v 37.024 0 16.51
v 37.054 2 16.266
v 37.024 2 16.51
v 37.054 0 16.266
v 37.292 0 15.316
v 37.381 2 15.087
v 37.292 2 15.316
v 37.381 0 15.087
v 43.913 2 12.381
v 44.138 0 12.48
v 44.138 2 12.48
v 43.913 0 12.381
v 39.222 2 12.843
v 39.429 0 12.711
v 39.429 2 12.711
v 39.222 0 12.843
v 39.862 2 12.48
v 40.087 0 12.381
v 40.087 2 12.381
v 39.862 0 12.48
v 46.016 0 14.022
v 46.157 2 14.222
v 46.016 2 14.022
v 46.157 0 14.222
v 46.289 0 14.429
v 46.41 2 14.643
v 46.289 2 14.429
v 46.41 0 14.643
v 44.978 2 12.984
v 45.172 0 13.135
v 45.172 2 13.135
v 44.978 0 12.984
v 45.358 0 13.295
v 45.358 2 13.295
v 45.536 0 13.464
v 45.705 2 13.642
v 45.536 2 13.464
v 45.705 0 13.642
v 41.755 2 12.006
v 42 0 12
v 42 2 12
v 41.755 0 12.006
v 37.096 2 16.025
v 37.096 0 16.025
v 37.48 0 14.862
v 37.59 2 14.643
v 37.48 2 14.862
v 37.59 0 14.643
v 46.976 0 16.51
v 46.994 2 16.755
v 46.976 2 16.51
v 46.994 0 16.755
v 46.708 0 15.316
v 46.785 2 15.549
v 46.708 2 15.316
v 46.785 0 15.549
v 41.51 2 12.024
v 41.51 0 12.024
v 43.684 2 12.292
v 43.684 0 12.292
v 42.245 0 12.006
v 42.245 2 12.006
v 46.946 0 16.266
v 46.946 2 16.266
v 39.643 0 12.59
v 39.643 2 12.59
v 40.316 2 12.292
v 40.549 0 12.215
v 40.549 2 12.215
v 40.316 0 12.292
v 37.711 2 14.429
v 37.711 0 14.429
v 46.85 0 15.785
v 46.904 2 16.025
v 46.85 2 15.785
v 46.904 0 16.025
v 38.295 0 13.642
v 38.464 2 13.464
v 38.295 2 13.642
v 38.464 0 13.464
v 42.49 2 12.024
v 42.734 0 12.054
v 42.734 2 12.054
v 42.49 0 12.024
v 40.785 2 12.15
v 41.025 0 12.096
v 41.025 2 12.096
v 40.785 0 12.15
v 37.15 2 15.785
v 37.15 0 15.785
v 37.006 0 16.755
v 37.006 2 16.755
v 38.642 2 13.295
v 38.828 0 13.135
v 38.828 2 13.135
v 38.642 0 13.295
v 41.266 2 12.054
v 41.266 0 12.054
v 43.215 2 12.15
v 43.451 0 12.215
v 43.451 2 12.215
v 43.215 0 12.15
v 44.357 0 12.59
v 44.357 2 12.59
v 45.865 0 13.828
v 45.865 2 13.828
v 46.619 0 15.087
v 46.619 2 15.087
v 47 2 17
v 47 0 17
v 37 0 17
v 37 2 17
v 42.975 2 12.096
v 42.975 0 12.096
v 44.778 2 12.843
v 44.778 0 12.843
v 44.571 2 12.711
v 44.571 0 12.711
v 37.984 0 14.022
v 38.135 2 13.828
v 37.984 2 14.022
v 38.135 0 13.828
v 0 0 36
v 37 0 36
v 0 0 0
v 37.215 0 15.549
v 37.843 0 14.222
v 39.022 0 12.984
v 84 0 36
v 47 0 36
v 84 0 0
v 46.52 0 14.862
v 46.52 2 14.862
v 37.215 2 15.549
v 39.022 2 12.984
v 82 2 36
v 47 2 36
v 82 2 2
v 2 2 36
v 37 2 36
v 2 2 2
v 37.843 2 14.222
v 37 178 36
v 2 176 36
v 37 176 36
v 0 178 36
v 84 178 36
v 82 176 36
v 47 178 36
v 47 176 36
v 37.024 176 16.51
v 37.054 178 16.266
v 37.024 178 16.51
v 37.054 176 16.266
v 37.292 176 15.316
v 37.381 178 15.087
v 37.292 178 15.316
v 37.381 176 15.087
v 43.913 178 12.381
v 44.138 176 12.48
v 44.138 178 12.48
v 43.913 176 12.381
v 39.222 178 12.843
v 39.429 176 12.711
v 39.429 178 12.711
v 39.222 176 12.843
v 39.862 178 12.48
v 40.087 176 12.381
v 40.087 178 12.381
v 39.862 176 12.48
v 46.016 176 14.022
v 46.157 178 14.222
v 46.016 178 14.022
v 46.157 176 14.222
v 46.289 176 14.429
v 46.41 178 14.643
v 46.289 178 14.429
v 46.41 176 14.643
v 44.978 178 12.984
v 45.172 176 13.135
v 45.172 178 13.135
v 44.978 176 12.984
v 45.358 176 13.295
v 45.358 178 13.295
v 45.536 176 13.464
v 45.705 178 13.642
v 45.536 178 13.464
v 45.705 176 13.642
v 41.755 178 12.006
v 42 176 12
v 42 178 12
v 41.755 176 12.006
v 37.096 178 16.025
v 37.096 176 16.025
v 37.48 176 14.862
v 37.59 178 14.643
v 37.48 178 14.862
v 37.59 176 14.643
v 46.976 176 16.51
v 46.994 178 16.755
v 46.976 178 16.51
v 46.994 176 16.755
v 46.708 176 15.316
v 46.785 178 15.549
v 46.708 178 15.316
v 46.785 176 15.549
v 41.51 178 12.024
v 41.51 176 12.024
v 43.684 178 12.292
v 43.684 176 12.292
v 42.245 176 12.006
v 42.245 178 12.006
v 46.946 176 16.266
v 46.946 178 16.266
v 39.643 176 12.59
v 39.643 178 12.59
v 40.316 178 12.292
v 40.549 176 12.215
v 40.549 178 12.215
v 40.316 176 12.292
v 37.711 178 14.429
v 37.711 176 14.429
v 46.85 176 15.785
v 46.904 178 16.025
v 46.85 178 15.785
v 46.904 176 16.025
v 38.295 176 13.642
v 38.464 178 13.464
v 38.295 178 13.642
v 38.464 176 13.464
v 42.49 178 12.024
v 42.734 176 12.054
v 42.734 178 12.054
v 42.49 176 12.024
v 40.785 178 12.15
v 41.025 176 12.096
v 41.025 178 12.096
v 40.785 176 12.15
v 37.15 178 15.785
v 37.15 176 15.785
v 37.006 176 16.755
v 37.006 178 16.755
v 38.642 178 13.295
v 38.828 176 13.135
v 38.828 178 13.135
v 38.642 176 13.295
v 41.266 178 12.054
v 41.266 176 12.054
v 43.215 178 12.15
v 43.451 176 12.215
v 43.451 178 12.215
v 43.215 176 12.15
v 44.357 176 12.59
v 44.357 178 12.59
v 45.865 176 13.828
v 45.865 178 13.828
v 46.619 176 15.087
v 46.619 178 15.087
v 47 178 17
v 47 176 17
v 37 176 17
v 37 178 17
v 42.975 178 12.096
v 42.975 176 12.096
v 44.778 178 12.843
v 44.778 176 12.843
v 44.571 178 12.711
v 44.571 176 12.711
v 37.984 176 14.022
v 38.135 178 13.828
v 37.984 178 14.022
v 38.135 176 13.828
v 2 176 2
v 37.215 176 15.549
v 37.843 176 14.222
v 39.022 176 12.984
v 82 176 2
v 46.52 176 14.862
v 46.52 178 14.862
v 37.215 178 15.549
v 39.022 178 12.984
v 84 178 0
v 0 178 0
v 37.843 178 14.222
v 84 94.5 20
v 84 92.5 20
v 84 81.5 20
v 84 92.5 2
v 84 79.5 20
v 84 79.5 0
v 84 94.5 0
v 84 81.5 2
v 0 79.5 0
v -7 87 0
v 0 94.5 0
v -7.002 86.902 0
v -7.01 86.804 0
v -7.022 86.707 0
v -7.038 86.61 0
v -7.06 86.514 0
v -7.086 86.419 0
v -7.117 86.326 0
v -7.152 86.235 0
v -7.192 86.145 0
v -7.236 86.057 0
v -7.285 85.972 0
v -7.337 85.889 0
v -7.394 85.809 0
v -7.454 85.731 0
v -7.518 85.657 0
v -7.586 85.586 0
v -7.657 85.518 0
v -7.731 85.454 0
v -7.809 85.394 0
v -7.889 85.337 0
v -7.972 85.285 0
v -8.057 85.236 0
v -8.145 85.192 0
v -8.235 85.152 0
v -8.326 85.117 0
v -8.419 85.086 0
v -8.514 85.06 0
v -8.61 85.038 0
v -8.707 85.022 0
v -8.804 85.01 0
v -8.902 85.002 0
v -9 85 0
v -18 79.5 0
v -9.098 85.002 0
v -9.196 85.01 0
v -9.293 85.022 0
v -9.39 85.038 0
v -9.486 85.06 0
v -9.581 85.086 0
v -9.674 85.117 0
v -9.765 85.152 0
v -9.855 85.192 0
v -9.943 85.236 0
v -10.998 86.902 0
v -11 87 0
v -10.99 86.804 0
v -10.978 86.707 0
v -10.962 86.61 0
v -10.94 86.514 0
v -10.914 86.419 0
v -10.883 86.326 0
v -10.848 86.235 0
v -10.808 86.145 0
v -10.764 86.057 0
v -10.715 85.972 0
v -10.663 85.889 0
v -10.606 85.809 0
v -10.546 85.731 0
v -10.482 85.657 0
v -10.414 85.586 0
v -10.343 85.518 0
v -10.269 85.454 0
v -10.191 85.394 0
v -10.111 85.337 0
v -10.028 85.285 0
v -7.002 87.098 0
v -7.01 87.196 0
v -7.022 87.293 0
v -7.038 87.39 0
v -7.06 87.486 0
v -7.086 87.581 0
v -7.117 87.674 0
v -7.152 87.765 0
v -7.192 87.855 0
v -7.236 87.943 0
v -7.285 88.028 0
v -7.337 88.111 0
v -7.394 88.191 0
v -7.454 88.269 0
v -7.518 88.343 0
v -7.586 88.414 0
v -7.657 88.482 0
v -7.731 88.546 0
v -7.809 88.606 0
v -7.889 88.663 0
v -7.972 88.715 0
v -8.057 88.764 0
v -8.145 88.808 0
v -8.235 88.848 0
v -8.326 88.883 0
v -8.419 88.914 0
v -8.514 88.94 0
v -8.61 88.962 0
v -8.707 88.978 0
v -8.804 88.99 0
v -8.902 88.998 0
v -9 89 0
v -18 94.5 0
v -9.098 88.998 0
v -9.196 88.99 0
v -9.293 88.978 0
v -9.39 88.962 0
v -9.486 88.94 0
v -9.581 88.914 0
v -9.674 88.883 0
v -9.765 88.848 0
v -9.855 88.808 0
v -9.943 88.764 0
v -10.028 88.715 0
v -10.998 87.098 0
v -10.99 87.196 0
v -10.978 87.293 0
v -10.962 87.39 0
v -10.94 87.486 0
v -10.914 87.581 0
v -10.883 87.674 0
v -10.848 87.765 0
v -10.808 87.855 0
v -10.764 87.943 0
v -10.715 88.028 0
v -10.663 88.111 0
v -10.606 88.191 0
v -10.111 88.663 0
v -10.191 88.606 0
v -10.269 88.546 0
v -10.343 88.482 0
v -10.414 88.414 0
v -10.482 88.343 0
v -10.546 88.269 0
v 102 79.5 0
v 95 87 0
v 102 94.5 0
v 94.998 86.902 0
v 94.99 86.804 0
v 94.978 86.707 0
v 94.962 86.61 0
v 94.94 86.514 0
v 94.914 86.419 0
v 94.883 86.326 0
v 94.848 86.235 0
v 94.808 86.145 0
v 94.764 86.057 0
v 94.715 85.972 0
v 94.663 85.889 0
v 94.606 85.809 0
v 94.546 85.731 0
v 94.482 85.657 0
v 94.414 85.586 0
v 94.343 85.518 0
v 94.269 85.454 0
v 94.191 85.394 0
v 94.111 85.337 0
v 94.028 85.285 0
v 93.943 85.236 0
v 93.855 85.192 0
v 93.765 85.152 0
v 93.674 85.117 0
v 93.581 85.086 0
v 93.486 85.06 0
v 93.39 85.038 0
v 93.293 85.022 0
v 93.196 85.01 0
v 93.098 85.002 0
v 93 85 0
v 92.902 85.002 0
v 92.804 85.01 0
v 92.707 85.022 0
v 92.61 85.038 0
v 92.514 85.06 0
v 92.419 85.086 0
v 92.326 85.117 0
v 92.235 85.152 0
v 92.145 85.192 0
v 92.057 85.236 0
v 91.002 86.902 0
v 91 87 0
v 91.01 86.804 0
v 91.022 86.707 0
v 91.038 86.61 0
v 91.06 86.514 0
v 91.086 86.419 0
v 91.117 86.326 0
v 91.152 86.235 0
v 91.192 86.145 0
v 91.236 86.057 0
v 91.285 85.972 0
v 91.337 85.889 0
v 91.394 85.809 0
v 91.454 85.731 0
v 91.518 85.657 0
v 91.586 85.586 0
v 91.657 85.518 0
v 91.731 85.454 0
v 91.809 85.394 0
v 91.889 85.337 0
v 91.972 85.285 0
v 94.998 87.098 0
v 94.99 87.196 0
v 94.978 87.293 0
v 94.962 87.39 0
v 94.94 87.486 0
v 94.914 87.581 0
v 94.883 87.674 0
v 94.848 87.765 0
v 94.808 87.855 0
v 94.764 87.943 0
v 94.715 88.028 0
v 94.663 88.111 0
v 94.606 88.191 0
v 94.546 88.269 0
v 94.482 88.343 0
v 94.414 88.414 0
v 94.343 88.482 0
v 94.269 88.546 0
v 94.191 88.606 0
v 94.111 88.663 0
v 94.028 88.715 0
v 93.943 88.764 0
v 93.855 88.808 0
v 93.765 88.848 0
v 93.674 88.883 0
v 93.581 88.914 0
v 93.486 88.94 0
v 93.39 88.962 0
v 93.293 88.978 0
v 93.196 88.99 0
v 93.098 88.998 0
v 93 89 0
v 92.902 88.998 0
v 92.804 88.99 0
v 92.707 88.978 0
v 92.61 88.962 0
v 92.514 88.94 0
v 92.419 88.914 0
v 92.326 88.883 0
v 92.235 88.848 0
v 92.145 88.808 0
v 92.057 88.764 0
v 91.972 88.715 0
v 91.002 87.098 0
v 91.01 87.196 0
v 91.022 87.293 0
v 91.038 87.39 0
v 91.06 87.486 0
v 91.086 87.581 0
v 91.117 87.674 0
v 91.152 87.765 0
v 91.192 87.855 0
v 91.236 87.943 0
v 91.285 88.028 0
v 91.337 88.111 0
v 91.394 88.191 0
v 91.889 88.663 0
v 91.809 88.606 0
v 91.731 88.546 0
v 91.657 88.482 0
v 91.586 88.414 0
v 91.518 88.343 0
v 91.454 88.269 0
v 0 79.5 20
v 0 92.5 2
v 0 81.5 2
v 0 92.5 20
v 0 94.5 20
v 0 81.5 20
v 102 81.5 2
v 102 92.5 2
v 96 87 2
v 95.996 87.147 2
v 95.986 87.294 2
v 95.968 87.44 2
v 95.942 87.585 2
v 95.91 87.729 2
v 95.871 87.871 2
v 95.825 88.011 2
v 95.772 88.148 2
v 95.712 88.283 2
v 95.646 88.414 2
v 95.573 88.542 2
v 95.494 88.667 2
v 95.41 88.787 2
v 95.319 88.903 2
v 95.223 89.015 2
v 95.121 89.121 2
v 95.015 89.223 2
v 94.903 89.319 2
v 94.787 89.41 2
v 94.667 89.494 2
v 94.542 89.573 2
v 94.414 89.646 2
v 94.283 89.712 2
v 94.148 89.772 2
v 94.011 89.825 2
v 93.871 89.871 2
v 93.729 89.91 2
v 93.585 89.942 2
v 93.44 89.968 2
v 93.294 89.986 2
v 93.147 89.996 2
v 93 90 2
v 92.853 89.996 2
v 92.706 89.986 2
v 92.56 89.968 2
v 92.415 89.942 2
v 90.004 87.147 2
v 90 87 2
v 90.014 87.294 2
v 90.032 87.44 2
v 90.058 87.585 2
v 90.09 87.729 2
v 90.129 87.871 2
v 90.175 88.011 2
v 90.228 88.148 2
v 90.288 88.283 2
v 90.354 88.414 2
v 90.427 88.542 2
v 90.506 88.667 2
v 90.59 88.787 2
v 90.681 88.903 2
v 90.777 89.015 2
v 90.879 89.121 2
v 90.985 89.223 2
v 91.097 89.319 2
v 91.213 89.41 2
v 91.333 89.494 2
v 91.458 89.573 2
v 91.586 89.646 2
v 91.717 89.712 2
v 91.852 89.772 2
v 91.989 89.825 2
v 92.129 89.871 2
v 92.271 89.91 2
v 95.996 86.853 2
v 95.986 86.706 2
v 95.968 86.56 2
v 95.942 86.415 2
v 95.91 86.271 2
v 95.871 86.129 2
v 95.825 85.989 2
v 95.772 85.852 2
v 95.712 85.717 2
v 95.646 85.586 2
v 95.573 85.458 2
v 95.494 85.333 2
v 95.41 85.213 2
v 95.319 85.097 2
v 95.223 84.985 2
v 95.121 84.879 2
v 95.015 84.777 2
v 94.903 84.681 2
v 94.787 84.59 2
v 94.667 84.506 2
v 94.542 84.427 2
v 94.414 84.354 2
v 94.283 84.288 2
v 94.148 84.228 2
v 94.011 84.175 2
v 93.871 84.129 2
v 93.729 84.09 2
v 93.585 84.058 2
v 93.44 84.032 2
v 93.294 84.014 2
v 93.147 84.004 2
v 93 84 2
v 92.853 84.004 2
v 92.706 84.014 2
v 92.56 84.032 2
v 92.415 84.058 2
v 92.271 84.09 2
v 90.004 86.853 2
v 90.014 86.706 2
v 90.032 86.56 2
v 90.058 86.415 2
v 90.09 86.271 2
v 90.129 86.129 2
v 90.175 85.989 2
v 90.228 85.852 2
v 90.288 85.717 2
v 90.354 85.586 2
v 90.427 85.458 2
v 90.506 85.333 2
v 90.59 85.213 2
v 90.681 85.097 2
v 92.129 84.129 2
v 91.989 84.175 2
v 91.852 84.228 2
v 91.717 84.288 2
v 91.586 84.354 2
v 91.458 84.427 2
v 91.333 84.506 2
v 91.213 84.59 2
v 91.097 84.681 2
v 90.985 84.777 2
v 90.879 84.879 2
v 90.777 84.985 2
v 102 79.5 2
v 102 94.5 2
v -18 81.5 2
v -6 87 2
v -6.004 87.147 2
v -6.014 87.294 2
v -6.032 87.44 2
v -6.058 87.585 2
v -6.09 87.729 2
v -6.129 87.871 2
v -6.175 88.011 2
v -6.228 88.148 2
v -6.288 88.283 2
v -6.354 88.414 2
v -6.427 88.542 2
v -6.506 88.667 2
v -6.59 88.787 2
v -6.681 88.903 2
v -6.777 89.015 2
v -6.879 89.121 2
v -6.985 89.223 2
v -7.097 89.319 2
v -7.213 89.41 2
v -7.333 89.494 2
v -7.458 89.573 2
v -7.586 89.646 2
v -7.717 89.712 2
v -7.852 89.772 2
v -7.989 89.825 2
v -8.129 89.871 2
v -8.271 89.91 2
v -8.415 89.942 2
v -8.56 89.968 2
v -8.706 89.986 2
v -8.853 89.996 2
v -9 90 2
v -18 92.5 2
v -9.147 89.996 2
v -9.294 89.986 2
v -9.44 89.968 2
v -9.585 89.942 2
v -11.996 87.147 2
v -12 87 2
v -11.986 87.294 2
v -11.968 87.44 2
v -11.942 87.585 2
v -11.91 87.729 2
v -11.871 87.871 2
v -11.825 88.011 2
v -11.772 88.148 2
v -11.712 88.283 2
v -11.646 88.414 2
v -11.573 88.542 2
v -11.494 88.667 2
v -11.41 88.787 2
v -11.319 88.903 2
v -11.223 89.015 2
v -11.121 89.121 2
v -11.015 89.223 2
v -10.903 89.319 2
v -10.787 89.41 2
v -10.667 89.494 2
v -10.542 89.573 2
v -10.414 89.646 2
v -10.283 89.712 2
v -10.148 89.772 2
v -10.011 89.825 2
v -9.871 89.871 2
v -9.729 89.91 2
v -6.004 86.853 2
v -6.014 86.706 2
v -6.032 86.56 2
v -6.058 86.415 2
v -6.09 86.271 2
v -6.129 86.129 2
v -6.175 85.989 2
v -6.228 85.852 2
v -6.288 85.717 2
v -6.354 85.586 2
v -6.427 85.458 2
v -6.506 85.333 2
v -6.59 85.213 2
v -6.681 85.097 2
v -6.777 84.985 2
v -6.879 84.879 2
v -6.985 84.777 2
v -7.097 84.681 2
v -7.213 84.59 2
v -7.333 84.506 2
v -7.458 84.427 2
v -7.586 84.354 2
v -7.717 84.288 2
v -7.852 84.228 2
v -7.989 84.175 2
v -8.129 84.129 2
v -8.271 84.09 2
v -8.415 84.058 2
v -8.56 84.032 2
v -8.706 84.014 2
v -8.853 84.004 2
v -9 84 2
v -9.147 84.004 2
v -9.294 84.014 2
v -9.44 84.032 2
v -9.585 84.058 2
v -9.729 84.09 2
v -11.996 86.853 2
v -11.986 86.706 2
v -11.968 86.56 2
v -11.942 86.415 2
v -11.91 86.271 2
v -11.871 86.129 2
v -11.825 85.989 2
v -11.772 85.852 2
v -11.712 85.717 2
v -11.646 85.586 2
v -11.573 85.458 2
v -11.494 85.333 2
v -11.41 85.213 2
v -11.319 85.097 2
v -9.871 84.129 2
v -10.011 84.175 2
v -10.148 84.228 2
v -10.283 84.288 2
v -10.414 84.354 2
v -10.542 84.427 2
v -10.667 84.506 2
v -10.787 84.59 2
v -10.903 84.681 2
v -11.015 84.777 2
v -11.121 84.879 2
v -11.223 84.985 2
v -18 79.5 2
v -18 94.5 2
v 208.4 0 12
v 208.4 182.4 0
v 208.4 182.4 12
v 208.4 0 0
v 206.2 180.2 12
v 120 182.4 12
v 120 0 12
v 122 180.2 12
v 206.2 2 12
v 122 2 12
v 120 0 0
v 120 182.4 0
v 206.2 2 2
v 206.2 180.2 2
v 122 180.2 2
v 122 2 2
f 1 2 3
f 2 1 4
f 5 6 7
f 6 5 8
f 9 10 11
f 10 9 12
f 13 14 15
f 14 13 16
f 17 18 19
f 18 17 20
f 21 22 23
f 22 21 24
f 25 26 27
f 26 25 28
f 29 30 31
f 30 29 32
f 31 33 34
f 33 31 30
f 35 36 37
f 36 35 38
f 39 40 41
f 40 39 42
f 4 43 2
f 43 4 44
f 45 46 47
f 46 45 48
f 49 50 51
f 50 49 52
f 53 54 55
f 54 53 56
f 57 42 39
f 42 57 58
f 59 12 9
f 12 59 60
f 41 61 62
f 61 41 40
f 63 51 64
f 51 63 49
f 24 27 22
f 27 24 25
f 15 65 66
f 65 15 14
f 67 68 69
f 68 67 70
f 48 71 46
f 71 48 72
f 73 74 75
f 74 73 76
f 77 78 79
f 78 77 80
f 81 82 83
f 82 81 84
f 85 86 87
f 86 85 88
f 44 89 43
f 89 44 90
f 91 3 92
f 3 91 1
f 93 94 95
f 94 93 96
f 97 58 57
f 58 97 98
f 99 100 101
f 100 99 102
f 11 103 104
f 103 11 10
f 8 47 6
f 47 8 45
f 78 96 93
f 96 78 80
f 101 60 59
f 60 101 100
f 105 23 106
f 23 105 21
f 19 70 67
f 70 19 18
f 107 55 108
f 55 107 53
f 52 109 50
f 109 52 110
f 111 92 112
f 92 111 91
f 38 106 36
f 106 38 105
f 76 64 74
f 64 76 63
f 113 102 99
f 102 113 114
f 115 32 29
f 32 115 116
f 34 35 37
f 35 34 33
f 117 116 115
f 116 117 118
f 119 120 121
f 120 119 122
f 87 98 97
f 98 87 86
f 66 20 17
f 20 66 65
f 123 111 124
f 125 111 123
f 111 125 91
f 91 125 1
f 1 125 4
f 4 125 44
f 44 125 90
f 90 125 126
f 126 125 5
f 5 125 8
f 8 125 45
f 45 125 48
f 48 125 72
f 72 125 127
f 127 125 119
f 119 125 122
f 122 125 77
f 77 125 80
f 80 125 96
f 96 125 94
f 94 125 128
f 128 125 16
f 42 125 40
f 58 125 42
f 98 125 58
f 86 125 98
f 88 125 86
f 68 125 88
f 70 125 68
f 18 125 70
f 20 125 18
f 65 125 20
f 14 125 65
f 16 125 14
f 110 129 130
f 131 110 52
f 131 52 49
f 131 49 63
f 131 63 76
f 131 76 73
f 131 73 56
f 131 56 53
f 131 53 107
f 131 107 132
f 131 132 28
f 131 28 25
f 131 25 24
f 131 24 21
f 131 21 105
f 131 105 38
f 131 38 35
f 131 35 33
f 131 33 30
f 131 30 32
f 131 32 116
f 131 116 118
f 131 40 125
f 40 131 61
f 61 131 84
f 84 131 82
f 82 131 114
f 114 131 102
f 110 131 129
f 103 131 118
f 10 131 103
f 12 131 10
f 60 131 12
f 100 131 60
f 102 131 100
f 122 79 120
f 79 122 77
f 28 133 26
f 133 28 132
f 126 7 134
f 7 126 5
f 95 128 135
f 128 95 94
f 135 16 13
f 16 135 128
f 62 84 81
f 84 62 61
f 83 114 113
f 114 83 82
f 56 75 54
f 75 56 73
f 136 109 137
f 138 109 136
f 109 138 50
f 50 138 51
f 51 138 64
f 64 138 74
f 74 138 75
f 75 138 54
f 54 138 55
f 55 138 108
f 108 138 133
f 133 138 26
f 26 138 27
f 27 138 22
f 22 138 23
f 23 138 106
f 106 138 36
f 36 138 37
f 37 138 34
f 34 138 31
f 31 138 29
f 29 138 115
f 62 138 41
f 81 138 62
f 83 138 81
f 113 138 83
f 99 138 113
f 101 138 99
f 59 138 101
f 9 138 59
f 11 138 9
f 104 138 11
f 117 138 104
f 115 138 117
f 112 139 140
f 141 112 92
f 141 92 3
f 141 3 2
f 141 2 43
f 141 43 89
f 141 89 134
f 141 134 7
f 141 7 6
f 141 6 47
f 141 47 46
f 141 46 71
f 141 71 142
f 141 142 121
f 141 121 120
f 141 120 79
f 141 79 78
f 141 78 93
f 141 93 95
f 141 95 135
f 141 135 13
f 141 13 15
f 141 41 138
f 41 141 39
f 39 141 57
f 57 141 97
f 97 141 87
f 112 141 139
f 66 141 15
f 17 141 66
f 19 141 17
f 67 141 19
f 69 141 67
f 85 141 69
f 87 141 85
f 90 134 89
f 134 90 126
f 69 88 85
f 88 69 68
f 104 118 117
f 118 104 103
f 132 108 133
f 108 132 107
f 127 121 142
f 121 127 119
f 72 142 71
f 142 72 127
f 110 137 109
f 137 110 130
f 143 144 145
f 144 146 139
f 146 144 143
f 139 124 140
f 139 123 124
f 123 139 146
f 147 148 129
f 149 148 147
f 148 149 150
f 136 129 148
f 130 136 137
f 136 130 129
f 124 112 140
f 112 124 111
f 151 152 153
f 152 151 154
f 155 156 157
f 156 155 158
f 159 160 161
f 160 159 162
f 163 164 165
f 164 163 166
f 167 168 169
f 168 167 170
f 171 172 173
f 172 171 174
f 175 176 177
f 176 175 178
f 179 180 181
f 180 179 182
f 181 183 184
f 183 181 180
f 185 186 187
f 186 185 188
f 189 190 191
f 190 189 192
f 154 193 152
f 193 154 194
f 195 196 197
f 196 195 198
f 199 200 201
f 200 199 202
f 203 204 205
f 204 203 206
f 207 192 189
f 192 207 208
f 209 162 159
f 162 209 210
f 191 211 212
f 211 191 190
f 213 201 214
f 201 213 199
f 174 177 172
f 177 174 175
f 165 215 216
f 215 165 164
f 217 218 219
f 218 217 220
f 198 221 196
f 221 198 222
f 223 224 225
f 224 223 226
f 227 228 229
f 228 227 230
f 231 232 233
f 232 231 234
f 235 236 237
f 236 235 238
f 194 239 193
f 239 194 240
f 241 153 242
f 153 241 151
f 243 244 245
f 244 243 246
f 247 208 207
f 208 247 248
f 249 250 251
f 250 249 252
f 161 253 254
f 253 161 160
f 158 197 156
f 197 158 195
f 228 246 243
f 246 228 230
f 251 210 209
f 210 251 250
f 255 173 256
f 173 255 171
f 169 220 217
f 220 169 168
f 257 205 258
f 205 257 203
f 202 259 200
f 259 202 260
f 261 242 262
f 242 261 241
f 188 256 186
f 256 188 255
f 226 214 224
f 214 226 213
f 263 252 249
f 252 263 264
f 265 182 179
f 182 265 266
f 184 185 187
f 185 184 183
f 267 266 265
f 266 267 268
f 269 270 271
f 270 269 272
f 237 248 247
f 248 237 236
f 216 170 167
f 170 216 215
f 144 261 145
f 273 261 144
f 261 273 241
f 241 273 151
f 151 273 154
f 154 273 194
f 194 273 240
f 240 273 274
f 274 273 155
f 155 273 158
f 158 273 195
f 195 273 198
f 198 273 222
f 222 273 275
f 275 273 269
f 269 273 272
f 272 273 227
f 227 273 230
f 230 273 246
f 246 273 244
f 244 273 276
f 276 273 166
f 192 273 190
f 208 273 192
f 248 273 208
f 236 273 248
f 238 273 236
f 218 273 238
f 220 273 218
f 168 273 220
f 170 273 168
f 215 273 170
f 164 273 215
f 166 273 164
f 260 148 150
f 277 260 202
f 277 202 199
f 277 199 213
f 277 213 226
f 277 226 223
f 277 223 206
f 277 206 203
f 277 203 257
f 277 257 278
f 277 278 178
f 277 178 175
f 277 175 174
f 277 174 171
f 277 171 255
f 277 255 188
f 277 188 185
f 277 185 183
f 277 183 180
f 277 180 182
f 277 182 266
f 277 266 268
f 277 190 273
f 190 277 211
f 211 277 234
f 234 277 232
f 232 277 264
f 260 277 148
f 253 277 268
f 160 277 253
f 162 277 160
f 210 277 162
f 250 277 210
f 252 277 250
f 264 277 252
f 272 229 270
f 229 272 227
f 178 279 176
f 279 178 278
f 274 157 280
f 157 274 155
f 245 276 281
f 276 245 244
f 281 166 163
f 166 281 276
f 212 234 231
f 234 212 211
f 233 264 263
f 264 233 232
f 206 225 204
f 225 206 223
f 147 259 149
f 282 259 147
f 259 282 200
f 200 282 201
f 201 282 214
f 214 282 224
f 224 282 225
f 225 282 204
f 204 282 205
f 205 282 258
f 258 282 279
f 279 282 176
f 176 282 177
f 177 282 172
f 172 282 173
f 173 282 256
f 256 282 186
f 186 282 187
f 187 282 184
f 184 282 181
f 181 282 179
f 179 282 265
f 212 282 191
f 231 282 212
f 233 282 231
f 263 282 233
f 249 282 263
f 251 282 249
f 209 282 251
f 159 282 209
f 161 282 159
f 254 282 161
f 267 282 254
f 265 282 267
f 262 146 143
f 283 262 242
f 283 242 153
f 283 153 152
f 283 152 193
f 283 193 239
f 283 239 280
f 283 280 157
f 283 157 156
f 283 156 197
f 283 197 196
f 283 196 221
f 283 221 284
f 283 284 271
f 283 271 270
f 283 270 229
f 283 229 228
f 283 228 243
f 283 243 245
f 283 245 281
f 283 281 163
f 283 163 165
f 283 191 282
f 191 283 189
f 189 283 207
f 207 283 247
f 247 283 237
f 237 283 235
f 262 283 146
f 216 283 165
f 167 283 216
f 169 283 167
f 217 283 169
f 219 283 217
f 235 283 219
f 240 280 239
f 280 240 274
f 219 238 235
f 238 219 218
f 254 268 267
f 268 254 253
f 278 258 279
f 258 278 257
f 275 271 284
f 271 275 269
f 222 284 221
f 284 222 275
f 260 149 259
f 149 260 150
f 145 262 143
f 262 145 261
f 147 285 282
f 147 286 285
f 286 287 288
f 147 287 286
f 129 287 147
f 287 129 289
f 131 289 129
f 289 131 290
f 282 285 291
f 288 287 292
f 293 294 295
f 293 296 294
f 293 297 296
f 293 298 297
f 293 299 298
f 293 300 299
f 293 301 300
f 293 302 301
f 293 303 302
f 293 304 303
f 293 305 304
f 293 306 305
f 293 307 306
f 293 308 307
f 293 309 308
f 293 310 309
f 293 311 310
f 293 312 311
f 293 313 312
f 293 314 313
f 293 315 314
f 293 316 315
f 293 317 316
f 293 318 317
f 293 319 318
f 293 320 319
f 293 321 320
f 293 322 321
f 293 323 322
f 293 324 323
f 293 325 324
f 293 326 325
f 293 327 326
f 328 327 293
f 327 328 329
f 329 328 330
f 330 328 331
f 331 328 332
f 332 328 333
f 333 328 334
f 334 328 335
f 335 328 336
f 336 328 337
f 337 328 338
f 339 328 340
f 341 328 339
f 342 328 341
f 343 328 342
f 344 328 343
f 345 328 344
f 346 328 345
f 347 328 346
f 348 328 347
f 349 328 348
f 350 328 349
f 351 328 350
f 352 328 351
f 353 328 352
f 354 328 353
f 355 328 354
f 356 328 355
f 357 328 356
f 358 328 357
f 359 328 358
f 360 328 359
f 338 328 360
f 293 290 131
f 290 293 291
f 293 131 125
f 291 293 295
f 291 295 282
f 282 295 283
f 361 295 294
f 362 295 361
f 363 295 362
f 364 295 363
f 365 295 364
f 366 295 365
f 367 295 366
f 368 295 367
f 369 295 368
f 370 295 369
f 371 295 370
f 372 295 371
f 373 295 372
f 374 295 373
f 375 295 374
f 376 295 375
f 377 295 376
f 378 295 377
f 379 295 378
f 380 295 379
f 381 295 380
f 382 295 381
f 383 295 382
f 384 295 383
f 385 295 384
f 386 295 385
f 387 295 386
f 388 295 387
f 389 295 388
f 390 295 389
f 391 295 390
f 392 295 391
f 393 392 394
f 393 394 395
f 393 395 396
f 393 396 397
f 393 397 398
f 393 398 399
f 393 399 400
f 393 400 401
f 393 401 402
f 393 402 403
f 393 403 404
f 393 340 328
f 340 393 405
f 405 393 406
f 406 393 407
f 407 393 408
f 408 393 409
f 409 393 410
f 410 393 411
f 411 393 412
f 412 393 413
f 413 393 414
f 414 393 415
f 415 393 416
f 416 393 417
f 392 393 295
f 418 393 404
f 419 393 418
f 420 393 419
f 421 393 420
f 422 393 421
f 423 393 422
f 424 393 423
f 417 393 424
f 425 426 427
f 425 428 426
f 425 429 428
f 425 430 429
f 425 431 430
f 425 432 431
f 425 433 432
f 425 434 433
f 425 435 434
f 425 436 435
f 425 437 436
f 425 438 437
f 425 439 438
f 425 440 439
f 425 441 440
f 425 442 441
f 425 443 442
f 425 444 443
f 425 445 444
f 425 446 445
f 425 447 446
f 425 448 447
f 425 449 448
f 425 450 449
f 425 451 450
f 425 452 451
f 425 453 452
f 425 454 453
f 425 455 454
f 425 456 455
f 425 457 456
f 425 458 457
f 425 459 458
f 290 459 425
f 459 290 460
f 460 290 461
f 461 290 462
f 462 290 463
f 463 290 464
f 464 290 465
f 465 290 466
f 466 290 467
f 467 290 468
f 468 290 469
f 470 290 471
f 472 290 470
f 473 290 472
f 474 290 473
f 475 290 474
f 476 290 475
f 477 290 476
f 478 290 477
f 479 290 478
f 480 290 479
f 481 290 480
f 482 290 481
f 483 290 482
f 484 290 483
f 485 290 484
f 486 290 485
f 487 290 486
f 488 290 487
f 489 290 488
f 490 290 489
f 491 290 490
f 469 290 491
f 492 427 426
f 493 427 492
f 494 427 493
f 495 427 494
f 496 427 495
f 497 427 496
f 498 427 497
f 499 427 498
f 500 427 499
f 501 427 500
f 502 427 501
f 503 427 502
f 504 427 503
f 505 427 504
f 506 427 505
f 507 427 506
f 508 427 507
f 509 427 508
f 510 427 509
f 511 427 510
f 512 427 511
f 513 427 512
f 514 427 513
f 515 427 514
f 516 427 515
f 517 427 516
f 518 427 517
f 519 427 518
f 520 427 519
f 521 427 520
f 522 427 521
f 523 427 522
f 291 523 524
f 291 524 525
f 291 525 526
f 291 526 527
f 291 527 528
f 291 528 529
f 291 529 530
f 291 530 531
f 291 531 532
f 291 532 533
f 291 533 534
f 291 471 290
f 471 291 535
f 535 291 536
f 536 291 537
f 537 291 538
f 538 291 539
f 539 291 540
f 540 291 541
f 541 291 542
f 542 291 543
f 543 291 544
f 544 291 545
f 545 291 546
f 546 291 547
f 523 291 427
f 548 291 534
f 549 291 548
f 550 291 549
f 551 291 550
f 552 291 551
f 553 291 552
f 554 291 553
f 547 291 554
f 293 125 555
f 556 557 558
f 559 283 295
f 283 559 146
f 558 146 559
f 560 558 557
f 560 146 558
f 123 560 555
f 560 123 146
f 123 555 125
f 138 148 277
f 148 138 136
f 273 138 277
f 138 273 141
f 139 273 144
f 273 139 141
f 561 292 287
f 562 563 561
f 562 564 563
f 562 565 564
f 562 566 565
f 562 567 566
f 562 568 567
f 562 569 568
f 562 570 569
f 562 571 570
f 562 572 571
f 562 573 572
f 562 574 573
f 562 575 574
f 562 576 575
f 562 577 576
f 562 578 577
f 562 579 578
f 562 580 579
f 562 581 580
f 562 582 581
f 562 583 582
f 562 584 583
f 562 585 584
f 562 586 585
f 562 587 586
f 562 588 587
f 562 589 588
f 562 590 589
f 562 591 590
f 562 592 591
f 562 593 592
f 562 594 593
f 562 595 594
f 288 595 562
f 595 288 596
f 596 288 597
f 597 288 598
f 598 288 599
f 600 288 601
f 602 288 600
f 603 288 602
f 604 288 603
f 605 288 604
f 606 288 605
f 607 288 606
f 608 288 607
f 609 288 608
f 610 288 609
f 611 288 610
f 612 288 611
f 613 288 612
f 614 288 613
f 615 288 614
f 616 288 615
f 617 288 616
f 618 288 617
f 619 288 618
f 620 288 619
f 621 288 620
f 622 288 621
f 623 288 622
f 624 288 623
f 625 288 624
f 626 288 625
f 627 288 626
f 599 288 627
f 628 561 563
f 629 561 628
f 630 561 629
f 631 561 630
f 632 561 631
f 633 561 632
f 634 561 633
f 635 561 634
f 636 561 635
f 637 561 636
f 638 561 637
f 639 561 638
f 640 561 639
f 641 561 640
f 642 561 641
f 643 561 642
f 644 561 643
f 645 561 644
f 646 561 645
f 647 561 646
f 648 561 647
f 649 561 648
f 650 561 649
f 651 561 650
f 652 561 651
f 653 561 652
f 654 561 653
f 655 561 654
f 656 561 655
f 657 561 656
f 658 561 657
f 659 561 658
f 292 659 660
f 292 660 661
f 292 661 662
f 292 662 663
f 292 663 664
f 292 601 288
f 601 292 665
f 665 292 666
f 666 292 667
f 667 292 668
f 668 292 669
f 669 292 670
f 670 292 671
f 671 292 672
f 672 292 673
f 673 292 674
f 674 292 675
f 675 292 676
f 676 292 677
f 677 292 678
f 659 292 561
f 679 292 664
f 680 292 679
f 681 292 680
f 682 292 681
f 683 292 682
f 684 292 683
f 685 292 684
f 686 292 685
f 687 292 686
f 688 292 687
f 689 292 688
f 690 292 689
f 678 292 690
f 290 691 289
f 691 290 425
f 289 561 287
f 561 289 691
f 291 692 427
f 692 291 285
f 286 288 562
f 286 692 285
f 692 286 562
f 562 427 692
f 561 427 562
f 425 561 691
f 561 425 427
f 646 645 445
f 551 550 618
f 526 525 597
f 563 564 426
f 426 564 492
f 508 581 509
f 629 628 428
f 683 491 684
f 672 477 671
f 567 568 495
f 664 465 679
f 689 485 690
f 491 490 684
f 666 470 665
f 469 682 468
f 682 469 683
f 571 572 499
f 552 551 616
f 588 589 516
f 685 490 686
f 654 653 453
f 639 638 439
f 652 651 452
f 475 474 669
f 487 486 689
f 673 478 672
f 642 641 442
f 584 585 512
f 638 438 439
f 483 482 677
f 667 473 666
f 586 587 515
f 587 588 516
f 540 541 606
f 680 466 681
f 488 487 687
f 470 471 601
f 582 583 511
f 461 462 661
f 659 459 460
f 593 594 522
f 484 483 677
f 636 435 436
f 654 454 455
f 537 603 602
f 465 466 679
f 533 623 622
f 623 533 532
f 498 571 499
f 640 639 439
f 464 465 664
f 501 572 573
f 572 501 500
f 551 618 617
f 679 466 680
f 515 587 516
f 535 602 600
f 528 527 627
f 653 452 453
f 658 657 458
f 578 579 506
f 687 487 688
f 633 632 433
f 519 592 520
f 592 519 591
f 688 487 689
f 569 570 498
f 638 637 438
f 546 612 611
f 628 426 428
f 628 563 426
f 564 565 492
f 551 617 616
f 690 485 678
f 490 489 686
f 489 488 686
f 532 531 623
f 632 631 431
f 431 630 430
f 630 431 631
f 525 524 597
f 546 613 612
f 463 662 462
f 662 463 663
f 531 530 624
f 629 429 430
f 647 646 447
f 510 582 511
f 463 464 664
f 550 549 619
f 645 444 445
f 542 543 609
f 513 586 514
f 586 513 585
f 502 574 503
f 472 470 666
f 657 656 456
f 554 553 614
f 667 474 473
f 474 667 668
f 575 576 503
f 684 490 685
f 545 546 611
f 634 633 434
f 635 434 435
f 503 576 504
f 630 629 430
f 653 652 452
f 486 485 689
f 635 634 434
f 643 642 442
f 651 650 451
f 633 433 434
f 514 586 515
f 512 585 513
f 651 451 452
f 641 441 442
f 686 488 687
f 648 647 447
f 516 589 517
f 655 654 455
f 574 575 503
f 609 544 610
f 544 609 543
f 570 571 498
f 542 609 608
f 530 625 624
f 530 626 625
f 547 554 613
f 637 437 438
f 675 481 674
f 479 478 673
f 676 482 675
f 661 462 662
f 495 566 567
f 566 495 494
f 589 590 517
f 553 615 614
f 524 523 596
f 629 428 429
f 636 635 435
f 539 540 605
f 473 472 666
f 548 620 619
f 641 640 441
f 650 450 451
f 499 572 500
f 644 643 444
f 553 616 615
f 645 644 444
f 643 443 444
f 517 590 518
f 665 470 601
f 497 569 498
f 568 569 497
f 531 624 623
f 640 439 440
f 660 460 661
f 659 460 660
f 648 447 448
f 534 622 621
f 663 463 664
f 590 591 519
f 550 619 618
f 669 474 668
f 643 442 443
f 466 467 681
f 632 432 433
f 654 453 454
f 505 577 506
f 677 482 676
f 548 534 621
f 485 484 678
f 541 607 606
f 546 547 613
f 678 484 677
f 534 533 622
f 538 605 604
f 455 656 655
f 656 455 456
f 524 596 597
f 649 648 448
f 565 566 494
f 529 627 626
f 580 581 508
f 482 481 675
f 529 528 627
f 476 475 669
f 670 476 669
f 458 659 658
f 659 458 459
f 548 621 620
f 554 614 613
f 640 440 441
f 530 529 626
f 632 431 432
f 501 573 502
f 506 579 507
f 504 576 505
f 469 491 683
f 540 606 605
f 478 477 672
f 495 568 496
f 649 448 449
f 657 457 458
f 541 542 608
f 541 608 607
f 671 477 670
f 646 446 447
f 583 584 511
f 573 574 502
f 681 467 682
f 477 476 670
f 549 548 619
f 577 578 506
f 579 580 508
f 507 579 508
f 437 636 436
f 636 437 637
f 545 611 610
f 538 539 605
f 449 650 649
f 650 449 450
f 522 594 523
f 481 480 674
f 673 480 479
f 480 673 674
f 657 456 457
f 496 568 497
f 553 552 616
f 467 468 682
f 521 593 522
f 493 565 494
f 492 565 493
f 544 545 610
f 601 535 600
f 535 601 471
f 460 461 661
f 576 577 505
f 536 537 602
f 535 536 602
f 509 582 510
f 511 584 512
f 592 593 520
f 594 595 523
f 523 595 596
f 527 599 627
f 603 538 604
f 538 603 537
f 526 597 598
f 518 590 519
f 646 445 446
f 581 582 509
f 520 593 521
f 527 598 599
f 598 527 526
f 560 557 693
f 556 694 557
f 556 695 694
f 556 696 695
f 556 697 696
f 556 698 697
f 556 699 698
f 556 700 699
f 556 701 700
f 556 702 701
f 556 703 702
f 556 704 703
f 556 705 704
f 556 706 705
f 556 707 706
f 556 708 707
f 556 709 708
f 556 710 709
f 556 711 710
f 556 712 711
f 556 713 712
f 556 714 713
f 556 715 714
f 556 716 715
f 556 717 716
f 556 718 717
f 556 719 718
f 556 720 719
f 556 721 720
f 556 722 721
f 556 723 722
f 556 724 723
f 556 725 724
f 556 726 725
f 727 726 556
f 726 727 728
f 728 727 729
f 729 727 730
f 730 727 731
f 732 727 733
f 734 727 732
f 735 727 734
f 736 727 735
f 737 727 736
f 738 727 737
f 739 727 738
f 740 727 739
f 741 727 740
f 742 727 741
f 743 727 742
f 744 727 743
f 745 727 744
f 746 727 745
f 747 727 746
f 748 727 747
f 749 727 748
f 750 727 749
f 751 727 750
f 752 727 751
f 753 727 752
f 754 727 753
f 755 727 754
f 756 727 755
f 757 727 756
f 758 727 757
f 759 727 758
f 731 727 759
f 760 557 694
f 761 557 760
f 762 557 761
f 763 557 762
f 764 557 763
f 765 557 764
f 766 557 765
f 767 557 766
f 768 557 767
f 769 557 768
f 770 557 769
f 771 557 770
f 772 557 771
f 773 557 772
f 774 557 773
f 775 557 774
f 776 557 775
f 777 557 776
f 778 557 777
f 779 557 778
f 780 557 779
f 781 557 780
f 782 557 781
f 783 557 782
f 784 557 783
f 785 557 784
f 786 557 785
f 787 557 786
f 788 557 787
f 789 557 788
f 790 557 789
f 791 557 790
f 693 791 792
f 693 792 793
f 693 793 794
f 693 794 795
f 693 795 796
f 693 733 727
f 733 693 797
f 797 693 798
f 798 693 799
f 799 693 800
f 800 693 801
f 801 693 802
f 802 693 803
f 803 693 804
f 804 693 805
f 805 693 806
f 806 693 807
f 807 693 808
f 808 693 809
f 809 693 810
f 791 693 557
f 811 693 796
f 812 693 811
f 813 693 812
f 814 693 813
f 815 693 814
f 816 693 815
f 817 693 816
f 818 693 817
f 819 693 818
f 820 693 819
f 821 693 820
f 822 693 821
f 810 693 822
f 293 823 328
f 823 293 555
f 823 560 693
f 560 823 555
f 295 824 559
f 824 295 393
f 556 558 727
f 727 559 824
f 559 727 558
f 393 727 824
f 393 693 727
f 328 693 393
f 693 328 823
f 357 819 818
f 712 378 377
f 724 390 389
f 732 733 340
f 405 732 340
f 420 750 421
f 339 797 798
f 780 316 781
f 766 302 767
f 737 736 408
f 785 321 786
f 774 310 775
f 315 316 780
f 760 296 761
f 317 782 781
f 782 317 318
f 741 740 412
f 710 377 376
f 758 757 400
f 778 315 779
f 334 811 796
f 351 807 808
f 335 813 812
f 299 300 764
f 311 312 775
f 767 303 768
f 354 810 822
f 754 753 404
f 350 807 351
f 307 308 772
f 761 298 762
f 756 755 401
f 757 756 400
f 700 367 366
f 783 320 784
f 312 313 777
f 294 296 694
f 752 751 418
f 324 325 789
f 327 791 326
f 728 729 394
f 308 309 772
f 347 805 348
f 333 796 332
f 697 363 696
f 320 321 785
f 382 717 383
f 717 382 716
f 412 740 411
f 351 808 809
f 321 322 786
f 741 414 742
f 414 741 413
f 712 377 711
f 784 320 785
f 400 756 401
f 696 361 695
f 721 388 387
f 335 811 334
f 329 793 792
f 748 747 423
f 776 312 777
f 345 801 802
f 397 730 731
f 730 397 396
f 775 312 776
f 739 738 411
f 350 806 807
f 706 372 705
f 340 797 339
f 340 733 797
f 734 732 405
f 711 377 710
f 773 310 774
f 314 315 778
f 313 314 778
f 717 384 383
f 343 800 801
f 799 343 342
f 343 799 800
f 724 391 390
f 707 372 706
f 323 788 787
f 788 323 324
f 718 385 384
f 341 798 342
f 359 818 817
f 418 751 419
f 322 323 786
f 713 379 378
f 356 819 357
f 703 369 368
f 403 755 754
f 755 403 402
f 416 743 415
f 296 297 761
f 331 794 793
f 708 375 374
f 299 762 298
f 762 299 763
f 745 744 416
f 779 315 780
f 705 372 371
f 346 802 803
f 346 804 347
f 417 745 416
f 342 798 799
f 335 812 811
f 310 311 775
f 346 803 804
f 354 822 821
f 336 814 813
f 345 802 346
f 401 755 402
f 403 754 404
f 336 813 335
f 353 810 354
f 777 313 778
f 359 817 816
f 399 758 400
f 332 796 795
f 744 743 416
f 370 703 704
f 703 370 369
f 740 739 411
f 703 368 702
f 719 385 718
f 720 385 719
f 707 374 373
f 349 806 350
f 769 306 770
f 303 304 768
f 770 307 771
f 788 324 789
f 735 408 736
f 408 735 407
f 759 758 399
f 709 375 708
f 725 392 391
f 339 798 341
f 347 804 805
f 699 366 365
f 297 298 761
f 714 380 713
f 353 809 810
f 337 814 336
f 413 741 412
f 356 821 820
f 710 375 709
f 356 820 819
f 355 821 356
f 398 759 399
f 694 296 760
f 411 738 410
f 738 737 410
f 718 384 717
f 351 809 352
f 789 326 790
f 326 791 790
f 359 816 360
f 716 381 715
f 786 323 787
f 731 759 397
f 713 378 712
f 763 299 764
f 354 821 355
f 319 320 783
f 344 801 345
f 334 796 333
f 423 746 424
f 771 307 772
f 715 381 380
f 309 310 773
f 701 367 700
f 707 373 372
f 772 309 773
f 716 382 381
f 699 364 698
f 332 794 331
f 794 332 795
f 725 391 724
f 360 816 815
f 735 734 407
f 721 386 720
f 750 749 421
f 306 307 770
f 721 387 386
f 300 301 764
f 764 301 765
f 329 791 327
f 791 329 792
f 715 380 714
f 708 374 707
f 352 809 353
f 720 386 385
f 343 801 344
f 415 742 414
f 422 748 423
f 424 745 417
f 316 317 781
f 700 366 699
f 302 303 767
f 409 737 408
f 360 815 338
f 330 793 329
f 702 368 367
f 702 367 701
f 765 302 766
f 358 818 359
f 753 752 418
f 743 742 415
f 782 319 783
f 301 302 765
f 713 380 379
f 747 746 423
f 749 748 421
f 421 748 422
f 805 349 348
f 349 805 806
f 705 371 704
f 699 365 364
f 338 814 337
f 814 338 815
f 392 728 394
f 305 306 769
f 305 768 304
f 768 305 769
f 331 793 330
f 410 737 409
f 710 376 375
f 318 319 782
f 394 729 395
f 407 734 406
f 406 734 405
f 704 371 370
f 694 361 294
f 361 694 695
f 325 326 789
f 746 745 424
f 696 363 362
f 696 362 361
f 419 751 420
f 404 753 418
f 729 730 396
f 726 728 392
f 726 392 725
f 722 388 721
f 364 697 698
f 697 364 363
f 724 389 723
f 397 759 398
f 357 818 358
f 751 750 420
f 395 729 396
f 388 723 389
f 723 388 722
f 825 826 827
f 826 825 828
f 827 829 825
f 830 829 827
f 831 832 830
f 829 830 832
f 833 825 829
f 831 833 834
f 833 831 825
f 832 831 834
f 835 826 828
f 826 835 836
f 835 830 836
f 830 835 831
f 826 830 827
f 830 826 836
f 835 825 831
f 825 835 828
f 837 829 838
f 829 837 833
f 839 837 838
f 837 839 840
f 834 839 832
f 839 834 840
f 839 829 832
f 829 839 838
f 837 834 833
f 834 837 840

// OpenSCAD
// Gunn Jonstrups laderholder

// En sirkel består av $fn streker
$fn = 128;

// Det er en bug i preview i openscad, denne fikser det
bugfix = $preview ? .1 : 0;

// Her er dimensjonene
height = 34;
width = 80;
length = 174;
wall = 2;
cable = 10;
mount_length = 18;
mount_width = 15;
mount_hole_top = 6;
mount_hole_bottom = 4;
lid_height = 10;
lid_tolerance = .2;

// Og koden

// Hakk til kablene
module cable_slot() {
    rotate([270,270,0]) {
        cylinder(d=cable,h=wall+bugfix*2);
    }
    translate([-cable/2-bugfix,0,0]) {
        cube([cable, wall+bugfix*2,height/2+wall+bugfix]);
    }
}

// Triangel til skrufeste
module triangle() {
    translate([0,wall,0]) {
        rotate([90,0,0]) {
            linear_extrude(wall) {
                polygon([[0,0],[mount_length,0],[0,mount_length]]);
            }
        }
    }
}

// Skrufeste
module screw_mount() {
    translate([0,0,wall]) {
        triangle();
        translate([0,mount_width-wall,0]) {
            triangle();
        }
    }
    difference() {
        cube([mount_length,mount_width,wall]);
        translate([mount_length/2,mount_width/2,-bugfix]) {
            cylinder(d1=mount_hole_bottom, d2=mount_hole_top, h=wall+bugfix*2);
        }
    }
}

// Boksen
module charger_box() {
    difference() {
        cube([width+wall*2, length+wall*2, height+wall]);
        translate([wall,wall,wall]) {
            cube([width, length, height+bugfix]);
        }
        translate([width/2+wall,-bugfix,height/2]) {
            cable_slot();
        }
        translate([width/2+wall,length+wall-bugfix,height/2]) {
            cable_slot();
        }
    }
}

// Lokk
module lid() {
    difference() {
        cube([width+wall*4+lid_tolerance*2, 
            length+wall*4+lid_tolerance*2, 
            lid_height+wall]);
        translate([wall,wall,wall]) {
            cube([width+wall*2+lid_tolerance, 
                length+wall*2+lid_tolerance,
                lid_height+bugfix]);
        }
    }
}

// Hovedkoden
charger_box();
translate([width+wall*2,length/2-mount_width/2,0]) {
    screw_mount();
}
translate([0,length/2-mount_width/2,0]) {
    mirror([1,0,0])
    screw_mount();
}
translate ([120,0,0]) {
    lid();
}
